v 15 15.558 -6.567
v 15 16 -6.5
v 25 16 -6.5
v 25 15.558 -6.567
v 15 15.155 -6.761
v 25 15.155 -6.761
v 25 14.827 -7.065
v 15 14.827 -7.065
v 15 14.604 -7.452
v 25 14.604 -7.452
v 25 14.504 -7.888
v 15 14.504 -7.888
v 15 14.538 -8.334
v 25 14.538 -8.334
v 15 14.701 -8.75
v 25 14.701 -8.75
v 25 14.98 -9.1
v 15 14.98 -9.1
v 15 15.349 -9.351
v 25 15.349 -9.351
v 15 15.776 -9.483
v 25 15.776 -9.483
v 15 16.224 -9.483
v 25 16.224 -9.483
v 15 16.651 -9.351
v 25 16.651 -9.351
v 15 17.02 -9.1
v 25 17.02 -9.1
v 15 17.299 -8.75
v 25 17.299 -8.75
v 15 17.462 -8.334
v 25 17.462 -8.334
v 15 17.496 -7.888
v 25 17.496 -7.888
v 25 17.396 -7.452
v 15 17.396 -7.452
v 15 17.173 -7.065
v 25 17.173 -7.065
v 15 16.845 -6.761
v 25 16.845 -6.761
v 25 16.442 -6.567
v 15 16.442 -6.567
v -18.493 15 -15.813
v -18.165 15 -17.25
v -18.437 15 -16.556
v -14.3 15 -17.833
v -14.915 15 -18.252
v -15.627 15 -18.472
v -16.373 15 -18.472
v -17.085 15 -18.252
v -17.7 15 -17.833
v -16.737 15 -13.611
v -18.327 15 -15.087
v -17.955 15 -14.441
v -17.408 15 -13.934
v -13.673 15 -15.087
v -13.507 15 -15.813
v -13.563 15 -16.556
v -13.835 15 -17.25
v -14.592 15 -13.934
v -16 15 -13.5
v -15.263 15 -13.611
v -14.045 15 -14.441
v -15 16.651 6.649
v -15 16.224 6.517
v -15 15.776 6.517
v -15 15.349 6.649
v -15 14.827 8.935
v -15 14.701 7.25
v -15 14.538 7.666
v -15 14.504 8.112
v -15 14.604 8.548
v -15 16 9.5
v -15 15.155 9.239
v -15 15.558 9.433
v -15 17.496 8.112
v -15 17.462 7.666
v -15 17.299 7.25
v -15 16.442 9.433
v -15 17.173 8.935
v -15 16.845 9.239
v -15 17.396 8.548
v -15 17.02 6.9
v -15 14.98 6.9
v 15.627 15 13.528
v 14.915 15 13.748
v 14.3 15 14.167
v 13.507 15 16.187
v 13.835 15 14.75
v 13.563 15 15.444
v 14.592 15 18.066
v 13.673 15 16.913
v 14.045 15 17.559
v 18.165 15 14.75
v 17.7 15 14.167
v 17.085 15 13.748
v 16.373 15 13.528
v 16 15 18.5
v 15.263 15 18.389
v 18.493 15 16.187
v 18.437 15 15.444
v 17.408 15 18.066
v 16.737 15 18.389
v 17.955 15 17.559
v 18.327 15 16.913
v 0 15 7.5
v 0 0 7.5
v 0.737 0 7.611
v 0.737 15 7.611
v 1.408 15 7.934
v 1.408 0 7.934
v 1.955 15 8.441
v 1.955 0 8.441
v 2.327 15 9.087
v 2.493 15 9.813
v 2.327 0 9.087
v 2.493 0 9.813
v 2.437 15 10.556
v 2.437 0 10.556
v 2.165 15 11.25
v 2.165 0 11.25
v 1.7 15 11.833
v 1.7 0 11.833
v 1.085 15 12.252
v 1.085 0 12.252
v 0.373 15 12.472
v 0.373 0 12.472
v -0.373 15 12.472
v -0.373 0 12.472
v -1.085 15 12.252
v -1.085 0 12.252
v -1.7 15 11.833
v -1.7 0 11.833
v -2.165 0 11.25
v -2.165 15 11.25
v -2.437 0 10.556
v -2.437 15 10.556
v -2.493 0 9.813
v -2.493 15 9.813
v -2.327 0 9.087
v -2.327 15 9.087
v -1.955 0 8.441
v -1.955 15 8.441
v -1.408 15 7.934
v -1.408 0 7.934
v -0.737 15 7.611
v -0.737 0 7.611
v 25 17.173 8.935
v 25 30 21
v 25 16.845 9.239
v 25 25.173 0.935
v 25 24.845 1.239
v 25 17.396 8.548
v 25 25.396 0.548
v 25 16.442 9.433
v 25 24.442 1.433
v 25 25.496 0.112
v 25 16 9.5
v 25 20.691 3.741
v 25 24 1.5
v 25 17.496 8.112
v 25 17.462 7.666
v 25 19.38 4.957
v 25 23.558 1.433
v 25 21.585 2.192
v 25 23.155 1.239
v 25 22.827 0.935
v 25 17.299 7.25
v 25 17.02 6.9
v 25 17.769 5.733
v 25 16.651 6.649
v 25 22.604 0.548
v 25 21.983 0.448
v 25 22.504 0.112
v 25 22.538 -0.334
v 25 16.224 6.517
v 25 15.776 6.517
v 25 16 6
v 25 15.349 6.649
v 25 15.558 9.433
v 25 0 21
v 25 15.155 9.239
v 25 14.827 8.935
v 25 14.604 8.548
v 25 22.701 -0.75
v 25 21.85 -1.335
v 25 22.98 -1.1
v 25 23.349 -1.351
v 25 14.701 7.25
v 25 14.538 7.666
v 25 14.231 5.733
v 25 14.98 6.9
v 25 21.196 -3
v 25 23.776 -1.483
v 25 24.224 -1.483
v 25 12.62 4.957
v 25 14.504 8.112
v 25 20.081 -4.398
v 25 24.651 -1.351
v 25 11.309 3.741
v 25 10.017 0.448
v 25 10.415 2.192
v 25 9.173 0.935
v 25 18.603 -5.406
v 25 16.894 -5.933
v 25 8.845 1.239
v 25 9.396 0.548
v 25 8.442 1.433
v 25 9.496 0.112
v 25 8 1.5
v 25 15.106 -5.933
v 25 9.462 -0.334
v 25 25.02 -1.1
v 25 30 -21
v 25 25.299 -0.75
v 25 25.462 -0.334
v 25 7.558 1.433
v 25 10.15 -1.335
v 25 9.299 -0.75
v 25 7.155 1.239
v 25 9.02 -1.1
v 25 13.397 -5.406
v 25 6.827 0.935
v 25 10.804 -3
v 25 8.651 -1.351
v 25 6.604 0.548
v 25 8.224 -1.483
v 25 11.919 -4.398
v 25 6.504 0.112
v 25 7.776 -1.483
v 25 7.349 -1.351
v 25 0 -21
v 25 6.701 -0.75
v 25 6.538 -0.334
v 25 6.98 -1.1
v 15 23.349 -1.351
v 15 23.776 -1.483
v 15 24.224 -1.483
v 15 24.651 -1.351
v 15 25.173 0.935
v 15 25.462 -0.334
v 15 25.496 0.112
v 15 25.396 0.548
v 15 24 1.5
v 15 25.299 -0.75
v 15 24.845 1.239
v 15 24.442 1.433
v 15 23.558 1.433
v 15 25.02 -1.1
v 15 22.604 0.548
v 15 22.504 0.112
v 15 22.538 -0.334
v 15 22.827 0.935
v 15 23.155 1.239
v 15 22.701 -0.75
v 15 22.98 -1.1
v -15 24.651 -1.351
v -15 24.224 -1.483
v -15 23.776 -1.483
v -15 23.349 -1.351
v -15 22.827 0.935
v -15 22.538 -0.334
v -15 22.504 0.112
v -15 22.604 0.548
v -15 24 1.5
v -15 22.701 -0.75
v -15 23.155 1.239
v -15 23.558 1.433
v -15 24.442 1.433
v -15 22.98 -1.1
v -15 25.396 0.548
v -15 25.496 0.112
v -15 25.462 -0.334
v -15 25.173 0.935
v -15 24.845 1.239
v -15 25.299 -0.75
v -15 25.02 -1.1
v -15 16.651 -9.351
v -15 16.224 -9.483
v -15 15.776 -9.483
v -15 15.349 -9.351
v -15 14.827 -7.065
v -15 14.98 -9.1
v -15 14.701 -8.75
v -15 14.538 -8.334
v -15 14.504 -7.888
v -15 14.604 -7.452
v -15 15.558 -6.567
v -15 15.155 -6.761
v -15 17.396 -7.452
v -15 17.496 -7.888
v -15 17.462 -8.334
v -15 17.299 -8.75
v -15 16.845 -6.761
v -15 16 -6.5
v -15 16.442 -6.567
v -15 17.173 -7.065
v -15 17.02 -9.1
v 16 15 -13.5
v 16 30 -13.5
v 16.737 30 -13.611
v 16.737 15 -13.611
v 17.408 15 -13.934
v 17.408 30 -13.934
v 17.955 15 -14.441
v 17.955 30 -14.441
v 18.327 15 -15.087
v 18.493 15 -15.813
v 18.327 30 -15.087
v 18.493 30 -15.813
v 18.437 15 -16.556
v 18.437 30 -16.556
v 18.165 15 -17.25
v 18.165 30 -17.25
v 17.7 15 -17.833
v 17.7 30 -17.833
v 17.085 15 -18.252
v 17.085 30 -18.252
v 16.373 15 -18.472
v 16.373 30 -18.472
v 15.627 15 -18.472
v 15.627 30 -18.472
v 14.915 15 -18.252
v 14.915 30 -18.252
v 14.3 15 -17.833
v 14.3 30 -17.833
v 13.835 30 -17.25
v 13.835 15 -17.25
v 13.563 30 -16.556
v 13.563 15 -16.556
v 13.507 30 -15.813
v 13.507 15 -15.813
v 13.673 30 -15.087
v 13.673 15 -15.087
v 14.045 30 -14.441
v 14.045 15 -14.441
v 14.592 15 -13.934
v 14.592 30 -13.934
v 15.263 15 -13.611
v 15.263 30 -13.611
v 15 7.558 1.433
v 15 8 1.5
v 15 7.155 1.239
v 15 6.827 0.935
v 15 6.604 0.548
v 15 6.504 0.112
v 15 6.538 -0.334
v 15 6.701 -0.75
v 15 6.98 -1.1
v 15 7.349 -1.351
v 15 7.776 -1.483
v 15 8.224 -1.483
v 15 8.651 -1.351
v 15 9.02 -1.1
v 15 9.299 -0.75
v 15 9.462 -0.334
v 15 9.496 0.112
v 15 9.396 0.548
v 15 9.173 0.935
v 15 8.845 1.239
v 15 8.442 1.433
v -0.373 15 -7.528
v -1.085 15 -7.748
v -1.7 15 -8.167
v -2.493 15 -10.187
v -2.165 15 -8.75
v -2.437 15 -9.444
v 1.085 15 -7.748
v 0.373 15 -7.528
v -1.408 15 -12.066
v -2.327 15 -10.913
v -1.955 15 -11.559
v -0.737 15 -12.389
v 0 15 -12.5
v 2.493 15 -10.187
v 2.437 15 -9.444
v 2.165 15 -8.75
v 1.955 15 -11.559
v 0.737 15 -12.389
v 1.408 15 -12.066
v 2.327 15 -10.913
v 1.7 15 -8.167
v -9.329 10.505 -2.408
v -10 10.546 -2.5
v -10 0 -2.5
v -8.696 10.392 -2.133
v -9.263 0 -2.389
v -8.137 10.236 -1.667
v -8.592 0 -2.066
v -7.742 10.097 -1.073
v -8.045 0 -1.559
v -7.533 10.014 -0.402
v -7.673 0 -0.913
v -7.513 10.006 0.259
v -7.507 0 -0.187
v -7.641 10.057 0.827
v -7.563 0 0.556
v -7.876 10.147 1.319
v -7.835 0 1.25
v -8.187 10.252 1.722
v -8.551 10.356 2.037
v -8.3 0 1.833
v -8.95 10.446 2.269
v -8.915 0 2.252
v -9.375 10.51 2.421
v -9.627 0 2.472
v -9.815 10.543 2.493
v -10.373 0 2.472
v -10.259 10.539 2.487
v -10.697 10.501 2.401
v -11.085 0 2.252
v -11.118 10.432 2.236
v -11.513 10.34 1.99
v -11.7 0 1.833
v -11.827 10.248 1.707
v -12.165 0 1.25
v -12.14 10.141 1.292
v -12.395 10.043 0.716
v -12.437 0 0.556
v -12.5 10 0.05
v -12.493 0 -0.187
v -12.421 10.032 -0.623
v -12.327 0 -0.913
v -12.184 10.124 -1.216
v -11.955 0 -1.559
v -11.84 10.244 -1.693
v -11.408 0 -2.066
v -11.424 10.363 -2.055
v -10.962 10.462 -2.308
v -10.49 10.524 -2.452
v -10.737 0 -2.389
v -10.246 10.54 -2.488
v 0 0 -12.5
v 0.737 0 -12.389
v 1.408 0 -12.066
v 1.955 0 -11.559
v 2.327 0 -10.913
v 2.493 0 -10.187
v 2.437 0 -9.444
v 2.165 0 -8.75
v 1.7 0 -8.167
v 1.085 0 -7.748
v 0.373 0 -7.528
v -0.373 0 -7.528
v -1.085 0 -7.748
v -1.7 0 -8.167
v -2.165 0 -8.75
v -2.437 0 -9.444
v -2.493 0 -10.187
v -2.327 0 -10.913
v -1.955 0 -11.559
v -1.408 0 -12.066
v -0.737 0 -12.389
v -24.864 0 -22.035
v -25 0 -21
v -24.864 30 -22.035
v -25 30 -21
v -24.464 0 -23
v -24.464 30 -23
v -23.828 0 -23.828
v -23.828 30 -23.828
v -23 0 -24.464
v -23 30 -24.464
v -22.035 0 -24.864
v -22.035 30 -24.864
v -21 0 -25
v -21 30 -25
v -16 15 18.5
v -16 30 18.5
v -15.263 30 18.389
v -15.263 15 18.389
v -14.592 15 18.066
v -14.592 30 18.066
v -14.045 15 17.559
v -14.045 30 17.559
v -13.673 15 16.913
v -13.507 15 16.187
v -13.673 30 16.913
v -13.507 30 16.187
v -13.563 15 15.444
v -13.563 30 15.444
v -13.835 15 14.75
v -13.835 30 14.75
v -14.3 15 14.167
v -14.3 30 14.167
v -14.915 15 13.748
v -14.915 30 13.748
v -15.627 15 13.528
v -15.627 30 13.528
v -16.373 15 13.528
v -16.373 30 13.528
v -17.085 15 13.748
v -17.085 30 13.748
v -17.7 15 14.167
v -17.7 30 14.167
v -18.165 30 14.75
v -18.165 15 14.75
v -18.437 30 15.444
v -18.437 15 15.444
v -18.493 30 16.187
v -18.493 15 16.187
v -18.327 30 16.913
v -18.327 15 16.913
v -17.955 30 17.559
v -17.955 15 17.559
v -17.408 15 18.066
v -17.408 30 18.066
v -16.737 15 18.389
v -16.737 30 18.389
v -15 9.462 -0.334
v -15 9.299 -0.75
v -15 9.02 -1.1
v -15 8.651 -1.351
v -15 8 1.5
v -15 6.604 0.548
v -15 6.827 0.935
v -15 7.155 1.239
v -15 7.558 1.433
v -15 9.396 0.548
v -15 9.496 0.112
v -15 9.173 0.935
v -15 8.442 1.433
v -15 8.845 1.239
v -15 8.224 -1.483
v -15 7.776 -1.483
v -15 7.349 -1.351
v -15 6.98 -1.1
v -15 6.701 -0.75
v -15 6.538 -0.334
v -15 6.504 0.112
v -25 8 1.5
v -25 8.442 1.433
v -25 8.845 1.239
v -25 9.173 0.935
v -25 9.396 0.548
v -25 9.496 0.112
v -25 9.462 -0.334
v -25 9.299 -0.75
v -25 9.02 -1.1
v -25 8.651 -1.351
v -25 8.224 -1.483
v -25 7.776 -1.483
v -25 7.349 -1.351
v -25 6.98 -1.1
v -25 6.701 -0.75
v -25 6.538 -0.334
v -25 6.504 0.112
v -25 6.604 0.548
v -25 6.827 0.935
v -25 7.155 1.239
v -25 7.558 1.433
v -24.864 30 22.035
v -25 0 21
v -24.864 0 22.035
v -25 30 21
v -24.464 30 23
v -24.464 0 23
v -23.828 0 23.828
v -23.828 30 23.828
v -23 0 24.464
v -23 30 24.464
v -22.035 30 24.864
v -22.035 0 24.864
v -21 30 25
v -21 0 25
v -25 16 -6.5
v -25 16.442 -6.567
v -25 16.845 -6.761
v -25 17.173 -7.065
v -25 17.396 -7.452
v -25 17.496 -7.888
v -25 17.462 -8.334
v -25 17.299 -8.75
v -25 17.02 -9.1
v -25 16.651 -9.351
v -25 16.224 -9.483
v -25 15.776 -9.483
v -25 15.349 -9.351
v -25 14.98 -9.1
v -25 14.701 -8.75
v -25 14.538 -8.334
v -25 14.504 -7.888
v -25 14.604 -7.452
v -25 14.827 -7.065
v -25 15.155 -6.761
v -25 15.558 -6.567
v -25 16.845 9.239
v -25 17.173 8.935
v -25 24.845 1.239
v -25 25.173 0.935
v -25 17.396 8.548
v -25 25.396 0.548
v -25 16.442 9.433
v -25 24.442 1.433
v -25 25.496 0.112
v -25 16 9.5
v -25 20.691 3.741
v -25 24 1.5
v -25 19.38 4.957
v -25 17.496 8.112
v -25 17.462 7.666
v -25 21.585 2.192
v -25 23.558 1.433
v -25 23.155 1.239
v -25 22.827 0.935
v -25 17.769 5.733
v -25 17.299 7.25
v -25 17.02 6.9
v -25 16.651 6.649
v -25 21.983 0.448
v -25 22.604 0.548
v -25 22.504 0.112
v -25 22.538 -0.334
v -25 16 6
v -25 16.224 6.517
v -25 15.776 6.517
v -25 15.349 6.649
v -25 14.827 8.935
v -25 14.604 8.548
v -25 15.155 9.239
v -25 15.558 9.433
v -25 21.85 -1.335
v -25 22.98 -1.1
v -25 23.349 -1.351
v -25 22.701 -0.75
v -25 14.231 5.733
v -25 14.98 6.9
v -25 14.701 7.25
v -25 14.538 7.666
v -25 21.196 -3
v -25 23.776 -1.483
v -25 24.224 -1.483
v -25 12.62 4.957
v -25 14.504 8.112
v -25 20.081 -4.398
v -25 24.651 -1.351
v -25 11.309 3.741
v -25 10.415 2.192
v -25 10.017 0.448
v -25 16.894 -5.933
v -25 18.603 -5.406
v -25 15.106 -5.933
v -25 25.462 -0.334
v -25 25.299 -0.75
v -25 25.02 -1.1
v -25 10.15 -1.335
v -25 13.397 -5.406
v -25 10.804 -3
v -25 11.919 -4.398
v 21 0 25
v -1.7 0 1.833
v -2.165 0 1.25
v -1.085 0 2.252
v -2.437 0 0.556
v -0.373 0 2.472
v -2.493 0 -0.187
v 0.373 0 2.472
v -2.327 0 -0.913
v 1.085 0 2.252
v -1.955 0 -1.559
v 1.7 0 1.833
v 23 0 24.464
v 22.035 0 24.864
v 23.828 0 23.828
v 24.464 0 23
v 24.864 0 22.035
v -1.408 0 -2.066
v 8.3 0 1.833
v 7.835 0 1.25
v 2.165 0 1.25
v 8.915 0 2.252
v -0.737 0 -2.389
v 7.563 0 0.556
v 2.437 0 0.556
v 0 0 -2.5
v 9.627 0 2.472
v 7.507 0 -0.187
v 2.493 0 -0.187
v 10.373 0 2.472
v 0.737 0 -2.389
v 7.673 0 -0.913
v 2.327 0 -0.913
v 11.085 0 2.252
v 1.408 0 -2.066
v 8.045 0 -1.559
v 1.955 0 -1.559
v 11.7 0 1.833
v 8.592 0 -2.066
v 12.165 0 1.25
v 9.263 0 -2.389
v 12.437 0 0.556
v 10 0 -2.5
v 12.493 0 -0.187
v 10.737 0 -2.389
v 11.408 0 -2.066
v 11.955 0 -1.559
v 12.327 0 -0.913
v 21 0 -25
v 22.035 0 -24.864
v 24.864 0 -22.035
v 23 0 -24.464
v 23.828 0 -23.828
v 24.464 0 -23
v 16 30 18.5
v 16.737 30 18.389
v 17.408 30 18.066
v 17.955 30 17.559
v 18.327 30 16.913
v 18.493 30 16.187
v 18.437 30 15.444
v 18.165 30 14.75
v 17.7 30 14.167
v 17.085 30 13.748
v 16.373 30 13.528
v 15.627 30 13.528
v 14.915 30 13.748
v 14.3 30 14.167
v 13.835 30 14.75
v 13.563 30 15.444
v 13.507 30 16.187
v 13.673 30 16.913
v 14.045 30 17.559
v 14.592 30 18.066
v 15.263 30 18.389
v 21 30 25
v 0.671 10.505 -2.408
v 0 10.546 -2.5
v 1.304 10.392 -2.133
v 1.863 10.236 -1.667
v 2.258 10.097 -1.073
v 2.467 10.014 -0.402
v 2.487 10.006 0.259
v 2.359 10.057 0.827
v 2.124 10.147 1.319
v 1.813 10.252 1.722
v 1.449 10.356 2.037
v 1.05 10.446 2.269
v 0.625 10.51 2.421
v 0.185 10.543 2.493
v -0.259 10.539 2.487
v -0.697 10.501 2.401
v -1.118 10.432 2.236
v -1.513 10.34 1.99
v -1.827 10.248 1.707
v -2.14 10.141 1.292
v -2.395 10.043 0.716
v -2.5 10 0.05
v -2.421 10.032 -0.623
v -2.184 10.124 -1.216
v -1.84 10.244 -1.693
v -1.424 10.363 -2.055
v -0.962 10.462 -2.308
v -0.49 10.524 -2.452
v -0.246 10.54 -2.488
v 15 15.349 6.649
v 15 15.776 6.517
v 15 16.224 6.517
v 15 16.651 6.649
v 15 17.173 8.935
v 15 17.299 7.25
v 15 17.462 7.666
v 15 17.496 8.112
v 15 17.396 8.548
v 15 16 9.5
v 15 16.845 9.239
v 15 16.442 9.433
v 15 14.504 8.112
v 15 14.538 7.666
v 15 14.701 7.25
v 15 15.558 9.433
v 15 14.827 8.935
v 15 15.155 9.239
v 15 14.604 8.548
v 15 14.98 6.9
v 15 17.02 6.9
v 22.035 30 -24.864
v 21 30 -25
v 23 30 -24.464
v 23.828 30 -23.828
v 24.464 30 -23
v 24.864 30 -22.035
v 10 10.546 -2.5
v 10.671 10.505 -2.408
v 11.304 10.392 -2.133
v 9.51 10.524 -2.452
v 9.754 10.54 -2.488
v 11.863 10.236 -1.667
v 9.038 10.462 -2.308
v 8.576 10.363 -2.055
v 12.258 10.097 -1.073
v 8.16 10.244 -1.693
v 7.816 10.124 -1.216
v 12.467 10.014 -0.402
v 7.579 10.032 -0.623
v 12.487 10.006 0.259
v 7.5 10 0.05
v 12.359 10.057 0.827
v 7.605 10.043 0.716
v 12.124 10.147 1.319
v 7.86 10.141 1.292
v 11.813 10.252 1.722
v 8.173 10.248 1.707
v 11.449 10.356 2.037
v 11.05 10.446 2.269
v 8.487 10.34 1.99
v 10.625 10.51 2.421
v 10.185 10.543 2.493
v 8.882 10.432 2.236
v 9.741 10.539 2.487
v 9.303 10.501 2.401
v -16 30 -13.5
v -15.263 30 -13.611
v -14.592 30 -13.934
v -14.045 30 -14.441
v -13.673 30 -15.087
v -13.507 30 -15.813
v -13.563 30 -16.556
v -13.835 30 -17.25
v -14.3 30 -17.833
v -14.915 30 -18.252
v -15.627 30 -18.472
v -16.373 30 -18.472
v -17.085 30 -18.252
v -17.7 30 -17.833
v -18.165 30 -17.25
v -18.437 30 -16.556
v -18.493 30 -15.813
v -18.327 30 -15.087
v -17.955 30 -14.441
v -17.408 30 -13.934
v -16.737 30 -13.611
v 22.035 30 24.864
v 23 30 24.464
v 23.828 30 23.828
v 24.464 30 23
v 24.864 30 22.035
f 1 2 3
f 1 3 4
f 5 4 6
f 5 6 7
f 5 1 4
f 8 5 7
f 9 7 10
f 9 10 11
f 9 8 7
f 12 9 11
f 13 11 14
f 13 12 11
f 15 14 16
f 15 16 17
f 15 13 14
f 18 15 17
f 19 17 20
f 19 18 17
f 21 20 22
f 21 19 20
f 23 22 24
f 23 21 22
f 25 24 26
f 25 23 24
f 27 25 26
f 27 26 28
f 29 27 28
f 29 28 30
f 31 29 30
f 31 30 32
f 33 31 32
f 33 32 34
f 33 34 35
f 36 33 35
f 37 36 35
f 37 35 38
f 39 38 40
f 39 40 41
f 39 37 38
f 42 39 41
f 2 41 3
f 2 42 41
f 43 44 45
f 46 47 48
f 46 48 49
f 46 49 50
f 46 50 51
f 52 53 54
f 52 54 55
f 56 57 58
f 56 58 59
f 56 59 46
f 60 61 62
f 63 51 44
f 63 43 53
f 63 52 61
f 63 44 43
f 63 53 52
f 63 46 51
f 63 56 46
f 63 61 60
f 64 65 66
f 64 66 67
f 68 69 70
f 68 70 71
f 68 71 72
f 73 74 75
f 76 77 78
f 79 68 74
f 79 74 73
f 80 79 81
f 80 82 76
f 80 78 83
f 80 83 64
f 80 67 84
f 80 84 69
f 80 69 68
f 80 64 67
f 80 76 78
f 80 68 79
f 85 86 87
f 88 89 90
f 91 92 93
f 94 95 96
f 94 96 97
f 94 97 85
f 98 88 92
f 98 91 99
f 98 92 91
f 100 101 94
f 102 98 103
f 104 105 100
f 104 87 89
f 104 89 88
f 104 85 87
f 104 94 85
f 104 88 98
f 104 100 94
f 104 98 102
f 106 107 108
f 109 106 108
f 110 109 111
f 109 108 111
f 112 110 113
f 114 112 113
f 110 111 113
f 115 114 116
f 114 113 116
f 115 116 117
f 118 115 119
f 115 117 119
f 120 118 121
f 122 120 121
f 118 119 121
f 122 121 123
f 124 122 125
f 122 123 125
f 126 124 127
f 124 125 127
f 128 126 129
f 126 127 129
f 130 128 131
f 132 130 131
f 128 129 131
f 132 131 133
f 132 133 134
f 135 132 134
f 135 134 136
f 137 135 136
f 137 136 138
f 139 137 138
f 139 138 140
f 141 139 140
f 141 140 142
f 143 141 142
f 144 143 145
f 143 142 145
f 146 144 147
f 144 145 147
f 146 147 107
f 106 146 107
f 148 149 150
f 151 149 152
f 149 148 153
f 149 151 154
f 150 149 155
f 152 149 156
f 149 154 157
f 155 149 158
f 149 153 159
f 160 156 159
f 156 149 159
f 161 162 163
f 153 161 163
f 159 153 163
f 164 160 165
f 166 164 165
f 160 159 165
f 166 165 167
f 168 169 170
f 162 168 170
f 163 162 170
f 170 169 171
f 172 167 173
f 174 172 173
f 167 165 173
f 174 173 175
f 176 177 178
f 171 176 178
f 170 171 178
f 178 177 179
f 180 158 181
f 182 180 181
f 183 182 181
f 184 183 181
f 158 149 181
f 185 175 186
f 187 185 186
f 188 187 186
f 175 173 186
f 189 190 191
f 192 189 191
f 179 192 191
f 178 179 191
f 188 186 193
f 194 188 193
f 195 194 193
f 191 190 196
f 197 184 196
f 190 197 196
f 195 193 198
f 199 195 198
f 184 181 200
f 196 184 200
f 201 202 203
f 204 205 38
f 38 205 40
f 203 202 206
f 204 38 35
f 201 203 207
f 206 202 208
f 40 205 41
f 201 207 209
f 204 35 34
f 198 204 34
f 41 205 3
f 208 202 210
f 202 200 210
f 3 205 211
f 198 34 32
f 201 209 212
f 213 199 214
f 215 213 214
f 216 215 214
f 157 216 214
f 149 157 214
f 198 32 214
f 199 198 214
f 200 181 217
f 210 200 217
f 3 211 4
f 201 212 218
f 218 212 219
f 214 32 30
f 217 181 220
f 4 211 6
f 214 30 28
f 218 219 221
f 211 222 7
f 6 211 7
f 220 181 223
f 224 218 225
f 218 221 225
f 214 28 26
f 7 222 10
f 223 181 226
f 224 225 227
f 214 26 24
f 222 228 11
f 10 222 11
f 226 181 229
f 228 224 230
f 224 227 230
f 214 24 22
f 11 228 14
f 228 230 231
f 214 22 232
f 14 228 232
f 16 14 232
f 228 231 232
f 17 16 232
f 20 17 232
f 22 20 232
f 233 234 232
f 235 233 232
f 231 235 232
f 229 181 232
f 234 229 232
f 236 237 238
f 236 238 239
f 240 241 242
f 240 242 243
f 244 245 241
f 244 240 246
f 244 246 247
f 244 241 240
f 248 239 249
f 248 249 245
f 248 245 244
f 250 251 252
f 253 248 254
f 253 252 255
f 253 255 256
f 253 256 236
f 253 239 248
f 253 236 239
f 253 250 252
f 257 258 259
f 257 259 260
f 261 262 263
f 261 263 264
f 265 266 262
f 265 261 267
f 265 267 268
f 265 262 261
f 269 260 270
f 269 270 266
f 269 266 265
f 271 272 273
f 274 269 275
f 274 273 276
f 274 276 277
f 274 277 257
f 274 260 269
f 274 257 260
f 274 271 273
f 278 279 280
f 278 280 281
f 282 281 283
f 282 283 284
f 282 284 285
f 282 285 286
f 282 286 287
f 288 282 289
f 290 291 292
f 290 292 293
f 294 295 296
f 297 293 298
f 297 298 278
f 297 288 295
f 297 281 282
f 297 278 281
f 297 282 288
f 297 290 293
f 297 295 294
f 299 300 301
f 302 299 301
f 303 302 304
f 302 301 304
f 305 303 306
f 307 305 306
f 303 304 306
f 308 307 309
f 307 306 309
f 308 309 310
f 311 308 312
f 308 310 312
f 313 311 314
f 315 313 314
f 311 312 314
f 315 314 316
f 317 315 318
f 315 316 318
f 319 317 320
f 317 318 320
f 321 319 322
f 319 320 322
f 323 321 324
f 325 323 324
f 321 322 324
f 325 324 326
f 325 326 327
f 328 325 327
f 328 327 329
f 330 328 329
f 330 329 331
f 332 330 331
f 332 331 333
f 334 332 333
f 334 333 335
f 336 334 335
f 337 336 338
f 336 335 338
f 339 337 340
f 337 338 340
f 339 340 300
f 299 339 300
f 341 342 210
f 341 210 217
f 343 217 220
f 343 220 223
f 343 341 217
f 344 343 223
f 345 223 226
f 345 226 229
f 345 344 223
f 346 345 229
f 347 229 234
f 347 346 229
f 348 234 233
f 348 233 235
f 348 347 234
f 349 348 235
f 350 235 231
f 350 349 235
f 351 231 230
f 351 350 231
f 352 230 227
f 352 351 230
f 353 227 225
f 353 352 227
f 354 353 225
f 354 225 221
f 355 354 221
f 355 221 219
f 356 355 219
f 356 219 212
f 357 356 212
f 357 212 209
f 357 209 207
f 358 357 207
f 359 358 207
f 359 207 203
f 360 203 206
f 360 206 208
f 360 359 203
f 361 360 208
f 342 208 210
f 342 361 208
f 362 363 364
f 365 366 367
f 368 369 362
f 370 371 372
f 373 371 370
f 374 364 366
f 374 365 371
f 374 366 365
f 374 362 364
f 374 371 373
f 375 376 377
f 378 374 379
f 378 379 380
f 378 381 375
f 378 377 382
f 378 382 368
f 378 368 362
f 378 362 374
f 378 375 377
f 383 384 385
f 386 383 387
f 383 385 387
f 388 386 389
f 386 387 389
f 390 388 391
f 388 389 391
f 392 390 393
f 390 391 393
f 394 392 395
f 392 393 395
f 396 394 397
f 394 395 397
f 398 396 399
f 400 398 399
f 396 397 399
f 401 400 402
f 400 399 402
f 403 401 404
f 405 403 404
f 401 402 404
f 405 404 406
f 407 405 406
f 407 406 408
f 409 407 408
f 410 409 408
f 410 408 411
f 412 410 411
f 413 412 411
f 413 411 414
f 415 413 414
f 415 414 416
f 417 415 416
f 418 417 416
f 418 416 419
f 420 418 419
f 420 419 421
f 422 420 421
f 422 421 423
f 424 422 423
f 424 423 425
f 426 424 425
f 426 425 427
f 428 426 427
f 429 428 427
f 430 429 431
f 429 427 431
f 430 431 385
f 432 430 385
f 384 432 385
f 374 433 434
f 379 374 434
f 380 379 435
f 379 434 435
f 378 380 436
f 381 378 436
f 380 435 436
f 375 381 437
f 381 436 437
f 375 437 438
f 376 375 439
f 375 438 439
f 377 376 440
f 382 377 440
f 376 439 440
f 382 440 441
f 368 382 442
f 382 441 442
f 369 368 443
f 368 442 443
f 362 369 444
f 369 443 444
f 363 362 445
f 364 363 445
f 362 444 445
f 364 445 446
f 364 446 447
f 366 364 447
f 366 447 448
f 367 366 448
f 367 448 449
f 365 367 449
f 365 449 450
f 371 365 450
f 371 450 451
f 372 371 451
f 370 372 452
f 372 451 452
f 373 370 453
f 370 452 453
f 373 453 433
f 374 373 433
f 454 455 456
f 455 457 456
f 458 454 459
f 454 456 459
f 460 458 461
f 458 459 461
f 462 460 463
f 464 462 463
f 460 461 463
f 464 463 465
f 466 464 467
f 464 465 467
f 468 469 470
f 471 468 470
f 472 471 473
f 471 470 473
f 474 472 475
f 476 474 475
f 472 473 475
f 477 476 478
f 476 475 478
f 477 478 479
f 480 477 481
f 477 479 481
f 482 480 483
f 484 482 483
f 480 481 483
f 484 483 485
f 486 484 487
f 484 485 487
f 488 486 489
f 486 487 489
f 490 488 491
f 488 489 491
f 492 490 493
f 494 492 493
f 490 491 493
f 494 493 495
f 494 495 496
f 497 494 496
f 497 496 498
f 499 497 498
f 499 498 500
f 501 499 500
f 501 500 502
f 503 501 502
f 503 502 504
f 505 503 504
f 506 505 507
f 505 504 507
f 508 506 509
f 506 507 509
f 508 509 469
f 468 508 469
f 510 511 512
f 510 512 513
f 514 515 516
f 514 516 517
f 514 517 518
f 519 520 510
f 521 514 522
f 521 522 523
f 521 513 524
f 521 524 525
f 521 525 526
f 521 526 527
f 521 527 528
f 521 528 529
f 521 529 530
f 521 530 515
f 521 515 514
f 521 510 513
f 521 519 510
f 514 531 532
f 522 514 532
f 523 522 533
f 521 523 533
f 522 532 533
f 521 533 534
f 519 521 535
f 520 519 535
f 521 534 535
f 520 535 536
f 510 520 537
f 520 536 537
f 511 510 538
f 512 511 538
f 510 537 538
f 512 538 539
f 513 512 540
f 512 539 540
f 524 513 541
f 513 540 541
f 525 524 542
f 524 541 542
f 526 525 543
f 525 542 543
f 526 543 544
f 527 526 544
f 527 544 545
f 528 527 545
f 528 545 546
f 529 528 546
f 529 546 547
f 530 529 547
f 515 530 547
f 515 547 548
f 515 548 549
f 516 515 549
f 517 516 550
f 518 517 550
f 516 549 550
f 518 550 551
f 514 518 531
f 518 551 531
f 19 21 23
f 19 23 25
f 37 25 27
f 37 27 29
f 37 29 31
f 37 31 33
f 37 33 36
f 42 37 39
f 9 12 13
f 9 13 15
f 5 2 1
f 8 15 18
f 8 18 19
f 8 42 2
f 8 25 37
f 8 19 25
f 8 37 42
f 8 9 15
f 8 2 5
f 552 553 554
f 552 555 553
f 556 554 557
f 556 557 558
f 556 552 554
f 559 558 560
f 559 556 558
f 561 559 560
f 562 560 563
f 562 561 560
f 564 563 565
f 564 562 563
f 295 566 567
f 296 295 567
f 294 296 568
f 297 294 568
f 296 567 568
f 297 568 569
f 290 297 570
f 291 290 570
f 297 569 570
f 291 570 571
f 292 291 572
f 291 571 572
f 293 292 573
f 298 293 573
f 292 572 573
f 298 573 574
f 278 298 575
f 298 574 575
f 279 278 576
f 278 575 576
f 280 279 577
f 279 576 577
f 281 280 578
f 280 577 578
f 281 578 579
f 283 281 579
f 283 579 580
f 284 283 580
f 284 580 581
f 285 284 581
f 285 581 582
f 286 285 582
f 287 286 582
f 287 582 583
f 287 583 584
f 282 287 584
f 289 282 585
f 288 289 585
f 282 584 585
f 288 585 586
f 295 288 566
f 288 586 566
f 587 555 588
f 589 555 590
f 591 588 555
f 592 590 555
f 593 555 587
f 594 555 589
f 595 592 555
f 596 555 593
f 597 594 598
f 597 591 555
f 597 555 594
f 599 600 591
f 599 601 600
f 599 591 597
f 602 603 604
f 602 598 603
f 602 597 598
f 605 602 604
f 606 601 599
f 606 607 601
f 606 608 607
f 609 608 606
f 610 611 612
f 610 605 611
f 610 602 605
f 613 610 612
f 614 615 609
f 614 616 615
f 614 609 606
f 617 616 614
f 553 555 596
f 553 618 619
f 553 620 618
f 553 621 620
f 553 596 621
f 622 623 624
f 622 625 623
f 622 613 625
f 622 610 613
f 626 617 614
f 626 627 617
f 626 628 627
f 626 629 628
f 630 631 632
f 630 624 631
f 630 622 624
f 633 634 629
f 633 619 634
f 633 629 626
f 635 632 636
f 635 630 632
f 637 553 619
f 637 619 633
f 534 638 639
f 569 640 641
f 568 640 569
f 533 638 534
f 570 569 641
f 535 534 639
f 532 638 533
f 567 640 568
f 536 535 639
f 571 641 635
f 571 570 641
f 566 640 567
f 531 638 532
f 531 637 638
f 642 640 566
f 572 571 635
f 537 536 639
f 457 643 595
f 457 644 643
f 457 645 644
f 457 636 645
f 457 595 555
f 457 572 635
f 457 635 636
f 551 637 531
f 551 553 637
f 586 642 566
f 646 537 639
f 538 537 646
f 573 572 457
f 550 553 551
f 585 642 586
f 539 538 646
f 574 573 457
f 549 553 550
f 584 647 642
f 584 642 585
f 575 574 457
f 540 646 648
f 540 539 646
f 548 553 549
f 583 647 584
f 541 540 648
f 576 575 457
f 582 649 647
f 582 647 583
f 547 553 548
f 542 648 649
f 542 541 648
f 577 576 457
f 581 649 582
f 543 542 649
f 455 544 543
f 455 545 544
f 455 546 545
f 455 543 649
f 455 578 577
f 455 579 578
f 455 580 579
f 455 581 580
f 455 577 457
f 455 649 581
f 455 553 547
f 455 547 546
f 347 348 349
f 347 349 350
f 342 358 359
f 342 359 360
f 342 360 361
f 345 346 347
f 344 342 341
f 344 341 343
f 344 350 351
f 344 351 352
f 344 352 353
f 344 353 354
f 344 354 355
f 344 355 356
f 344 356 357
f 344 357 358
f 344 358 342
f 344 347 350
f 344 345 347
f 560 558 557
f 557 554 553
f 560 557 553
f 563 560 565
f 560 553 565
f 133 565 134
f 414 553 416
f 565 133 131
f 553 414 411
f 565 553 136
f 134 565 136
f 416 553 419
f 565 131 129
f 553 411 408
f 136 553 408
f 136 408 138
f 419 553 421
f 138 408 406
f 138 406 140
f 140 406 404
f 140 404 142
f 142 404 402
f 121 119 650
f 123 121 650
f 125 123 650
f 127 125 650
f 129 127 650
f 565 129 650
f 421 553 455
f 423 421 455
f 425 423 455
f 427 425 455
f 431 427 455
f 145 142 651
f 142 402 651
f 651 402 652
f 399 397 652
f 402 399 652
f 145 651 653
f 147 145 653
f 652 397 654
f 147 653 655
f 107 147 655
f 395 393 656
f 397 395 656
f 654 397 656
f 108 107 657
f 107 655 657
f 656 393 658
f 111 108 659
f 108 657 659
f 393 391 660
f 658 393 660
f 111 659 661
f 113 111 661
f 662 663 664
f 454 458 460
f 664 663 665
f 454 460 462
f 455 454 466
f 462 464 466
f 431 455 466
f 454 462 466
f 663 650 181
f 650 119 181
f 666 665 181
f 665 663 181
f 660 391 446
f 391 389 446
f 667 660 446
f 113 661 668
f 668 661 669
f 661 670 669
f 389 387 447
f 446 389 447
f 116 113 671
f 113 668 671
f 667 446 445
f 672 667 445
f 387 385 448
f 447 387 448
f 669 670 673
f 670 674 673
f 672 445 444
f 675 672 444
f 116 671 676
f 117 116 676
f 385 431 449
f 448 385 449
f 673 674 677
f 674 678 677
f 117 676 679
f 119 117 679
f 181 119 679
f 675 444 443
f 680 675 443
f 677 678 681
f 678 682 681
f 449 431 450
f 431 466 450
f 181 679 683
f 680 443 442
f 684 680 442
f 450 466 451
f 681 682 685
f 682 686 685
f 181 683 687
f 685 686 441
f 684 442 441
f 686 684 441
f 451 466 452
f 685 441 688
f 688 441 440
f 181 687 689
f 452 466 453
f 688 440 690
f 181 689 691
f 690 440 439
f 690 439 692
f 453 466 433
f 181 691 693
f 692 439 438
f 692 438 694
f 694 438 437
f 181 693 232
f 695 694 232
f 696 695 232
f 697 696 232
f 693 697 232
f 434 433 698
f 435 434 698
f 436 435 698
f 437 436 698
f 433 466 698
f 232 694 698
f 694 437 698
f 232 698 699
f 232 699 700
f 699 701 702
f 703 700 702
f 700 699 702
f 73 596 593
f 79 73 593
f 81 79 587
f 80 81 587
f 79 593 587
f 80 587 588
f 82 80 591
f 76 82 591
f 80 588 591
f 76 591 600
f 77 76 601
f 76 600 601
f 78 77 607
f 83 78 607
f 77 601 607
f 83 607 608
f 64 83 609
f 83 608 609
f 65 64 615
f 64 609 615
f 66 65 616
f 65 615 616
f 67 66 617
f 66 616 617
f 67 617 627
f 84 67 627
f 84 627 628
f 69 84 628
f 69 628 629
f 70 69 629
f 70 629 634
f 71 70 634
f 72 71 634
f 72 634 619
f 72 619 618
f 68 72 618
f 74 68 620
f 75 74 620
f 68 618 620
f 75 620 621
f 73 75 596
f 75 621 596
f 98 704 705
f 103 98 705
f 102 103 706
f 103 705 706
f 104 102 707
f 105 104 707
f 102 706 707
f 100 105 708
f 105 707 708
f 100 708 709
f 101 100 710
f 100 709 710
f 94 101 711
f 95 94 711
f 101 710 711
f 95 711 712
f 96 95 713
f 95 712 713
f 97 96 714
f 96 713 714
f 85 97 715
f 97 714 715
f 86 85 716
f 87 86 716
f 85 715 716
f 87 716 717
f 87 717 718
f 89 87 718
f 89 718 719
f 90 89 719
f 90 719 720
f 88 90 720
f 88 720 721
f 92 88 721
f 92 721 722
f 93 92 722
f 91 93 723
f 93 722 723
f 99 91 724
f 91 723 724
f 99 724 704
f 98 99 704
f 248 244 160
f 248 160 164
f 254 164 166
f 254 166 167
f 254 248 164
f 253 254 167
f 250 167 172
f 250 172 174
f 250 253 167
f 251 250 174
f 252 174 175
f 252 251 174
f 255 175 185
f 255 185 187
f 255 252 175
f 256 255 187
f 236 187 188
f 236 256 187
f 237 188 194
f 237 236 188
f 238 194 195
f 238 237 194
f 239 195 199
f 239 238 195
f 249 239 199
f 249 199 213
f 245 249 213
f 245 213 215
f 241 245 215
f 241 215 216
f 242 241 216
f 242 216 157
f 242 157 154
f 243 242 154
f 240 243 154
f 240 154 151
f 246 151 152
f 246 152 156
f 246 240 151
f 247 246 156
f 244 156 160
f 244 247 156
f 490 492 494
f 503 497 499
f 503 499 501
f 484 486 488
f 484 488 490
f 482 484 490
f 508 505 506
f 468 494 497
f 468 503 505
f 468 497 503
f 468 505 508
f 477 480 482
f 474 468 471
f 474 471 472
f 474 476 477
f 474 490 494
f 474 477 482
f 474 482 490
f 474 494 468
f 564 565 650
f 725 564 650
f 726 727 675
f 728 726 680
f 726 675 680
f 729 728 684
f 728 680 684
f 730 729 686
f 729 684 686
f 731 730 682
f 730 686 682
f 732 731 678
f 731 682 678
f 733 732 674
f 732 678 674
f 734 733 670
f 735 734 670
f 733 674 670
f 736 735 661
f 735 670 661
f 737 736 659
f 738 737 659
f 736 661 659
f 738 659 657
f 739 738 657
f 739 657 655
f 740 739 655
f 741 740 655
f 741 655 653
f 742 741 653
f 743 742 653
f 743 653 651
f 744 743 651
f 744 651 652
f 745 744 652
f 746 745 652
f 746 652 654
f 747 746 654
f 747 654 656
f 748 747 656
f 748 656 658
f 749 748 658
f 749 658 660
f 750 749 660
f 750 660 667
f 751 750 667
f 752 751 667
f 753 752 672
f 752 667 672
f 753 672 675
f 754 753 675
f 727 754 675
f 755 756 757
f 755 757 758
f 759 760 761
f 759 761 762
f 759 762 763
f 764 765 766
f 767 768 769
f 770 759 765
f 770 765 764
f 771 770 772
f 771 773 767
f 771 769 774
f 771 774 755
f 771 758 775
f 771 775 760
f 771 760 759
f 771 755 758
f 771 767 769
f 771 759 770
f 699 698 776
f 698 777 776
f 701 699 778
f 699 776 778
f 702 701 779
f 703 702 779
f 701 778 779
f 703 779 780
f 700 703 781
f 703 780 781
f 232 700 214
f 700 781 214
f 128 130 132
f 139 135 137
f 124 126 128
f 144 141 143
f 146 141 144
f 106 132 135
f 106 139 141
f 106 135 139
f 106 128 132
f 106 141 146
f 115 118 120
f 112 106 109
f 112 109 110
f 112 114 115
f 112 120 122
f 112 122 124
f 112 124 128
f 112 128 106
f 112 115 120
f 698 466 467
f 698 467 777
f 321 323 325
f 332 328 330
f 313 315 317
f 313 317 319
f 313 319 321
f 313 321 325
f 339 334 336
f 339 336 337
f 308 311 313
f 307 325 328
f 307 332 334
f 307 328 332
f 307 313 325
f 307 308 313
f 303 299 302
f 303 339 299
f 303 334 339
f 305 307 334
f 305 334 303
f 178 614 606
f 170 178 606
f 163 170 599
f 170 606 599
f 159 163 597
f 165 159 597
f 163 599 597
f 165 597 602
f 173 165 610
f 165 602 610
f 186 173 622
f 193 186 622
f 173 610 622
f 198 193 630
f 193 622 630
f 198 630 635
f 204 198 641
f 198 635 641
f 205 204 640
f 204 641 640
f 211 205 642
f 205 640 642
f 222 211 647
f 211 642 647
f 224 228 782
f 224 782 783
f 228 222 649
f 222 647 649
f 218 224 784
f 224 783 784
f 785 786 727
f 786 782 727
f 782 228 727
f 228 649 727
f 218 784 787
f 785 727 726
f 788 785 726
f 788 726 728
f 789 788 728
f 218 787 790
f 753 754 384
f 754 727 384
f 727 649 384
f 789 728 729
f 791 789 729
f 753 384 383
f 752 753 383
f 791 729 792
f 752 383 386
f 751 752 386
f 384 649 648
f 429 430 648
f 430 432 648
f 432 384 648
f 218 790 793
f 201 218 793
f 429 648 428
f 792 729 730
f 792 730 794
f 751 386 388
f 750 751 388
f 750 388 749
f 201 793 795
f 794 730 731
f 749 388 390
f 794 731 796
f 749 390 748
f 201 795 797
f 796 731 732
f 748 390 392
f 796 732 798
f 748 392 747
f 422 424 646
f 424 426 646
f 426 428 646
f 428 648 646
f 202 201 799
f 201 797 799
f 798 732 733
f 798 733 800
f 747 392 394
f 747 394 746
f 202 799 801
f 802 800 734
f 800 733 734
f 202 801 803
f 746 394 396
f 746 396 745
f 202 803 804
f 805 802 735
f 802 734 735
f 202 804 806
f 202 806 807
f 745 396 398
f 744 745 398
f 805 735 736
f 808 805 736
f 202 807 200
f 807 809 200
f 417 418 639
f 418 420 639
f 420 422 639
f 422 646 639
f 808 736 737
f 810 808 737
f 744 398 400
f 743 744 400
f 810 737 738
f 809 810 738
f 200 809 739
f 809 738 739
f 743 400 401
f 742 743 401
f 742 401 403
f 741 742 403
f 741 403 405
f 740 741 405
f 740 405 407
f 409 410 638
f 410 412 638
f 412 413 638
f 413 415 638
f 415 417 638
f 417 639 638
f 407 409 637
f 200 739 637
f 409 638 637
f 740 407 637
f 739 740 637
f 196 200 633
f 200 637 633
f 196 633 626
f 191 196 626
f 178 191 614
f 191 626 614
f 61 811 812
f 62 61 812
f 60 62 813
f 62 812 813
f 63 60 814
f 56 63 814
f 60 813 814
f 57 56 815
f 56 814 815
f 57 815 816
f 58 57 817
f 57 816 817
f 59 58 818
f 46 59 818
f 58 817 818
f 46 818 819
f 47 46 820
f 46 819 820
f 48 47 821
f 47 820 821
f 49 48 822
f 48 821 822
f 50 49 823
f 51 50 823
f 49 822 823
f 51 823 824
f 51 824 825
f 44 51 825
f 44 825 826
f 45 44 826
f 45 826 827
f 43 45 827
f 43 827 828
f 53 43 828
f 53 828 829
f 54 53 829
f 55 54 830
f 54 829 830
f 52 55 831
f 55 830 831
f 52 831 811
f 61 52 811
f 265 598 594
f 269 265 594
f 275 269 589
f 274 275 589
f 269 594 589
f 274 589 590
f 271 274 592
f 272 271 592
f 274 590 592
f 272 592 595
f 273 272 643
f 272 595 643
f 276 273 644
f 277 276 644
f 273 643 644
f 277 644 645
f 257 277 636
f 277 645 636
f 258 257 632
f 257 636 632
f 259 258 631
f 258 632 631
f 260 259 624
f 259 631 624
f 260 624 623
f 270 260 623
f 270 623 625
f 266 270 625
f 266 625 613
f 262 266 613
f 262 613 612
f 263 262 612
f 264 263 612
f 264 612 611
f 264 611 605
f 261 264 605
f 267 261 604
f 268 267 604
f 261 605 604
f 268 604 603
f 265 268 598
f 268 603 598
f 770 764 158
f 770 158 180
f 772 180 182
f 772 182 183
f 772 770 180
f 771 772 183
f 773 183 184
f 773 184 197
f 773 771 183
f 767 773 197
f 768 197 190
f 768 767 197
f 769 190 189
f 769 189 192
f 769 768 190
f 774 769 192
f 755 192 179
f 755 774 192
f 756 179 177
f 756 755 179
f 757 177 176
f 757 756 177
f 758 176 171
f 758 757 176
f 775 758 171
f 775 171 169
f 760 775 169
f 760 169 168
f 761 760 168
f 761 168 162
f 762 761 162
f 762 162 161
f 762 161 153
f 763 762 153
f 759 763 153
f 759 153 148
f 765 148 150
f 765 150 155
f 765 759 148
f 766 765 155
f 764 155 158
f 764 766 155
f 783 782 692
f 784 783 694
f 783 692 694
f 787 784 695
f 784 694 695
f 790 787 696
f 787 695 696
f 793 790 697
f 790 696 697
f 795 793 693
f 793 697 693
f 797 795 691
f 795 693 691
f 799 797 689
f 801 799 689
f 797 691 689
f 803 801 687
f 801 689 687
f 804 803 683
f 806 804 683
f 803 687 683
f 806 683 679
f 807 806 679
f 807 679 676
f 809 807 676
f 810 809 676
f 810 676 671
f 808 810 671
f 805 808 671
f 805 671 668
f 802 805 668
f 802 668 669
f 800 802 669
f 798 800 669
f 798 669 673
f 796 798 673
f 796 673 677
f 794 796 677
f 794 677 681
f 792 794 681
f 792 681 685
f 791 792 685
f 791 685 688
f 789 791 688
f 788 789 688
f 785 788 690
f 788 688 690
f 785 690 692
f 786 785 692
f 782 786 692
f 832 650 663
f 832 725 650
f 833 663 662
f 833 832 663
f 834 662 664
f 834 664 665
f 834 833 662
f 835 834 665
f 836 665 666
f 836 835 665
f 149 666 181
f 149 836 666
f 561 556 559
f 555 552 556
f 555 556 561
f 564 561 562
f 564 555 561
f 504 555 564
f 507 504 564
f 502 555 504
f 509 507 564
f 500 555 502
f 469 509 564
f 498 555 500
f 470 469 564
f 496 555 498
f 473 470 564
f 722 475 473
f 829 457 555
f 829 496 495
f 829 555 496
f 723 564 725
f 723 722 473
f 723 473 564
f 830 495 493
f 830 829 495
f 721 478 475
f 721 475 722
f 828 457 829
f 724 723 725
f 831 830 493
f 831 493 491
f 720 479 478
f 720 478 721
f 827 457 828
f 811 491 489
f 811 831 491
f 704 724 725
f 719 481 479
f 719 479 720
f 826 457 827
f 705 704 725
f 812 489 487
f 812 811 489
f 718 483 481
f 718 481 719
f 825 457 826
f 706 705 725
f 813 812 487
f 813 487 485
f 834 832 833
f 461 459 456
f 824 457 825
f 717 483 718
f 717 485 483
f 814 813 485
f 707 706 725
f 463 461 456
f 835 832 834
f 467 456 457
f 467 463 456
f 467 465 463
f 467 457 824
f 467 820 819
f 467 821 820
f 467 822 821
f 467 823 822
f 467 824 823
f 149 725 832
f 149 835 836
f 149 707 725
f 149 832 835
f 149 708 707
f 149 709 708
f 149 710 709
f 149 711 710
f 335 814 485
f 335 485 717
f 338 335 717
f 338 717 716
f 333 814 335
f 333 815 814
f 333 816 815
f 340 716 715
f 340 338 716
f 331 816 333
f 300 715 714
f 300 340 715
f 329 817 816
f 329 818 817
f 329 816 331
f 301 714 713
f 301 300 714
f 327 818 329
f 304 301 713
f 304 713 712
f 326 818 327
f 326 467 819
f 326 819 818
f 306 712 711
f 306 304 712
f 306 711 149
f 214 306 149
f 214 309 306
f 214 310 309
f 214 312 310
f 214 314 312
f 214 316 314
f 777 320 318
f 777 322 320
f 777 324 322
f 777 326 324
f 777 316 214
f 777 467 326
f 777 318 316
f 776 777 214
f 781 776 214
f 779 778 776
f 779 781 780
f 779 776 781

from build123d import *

# Parameters (mm, degrees)
SKETCH1_W           = 50
SKETCH1_H           = 50
BOSS_EXTRUDE1_DEPTH = 30
SKETCH2_R           = 2.5
CUT_EXTRUDE1_DEPTH  = 15
CUT_EXTRUDE2_REACH  = 65.443
SKETCH4_R           = 6
SKETCH5_R           = 1.5
CUT_EXTRUDE3_DEPTH  = 10
CUT_EXTRUDE4_START  = -10
SKETCH6_R           = 1.5
CUT_EXTRUDE4_DEPTH  = 10
FILLET1_R           = 4
SKETCH8_R           = 2.5
CUT_EXTRUDE5_DEPTH  = 15


with BuildPart() as part:
    # Sketch1 → Boss-Extrude1 (new body)
    with BuildSketch(Plane(origin=(0, 0, 0), x_dir=(1, 0, 0), z_dir=(0, 1, 0))):
        Rectangle(SKETCH1_W, SKETCH1_H)
    extrude(amount=BOSS_EXTRUDE1_DEPTH)

    # Sketch2 → Cut-Extrude1 (cut)
    with BuildSketch(Plane.XZ):
        with Locations(Location((0, 10, 0), (0, 0, 270))):
            Circle(SKETCH2_R)
        with Locations(Location((0, -10, 0), (0, 0, 270))):
            Circle(SKETCH2_R)
        with Locations(Location((10, 0, 0), (0, 0, 270))):
            Circle(SKETCH2_R)
        with Locations(Location((-10, 0, 0), (0, 0, 270))):
            Circle(SKETCH2_R)
        with Locations(Location((0, 0, 0), (0, 0, 270))):
            Circle(SKETCH2_R)
    extrude(amount=-CUT_EXTRUDE1_DEPTH, mode=Mode.SUBTRACT)

    # Sketch4 → Cut-Extrude2 (cut, up to next)
    with BuildSketch(Plane.ZY.offset(25), mode=Mode.PRIVATE) as cut_extrude2_sk1:
        with Locations((0, 16)):
            Circle(SKETCH4_R)
    cut_extrude2_tool1 = extrude(cut_extrude2_sk1.sketch, amount=-CUT_EXTRUDE2_REACH, mode=Mode.PRIVATE) & part.part
    add(cut_extrude2_tool1.solids().sort_by_distance((-25, 16, 0))[0], mode=Mode.SUBTRACT)

    # Sketch5 → Cut-Extrude3 (cut)
    with BuildSketch(Plane.ZY.offset(25)):
        with Locations((-8, 16)):
            Circle(SKETCH5_R)
        with Locations((8, 16)):
            Circle(SKETCH5_R)
        with Locations((0, 8)):
            Circle(SKETCH5_R)
        with Locations((0, 24)):
            Circle(SKETCH5_R)
    extrude(amount=-CUT_EXTRUDE3_DEPTH, mode=Mode.SUBTRACT)

    # Sketch6 → Cut-Extrude4 (cut)
    with BuildSketch(Plane(origin=(25, 0, 0), x_dir=(0, 0, -1), z_dir=(1, 0, 0)).offset(CUT_EXTRUDE4_START)):
        with Locations(Location((-8, 16, 0), (0, 0, 180))):
            Circle(SKETCH6_R)
        with Locations(Location((8, 16, 0), (0, 0, 180))):
            Circle(SKETCH6_R)
        with Locations(Location((0, 24, 0), (0, 0, 180))):
            Circle(SKETCH6_R)
        with Locations(Location((0, 8, 0), (0, 0, 180))):
            Circle(SKETCH6_R)
    extrude(amount=CUT_EXTRUDE4_DEPTH, mode=Mode.SUBTRACT)

    # Fillet1
    fillet1_edges = [part.edges().sort_by_distance(p)[0] for p in [
        (25, 15, 25),
        (-25, 15, 25),
        (-25, 15, -25),
        (25, 15, -25),
    ]]
    fillet(fillet1_edges, radius=FILLET1_R)

    # Sketch8 → Cut-Extrude5 (cut)
    with BuildSketch(Plane(origin=(0, 30, 0), x_dir=(1, 0, 0), z_dir=(0, 1, 0))):
        with Locations(Location((-16, 16, 0), (0, 0, 270))):
            Circle(SKETCH8_R)
        with Locations(Location((16, 16, 0), (0, 0, 270))):
            Circle(SKETCH8_R)
        with Locations(Location((16, -16, 0), (0, 0, 270))):
            Circle(SKETCH8_R)
        with Locations(Location((-16, -16, 0), (0, 0, 270))):
            Circle(SKETCH8_R)
    extrude(amount=-CUT_EXTRUDE5_DEPTH, mode=Mode.SUBTRACT)


solid = part.part
